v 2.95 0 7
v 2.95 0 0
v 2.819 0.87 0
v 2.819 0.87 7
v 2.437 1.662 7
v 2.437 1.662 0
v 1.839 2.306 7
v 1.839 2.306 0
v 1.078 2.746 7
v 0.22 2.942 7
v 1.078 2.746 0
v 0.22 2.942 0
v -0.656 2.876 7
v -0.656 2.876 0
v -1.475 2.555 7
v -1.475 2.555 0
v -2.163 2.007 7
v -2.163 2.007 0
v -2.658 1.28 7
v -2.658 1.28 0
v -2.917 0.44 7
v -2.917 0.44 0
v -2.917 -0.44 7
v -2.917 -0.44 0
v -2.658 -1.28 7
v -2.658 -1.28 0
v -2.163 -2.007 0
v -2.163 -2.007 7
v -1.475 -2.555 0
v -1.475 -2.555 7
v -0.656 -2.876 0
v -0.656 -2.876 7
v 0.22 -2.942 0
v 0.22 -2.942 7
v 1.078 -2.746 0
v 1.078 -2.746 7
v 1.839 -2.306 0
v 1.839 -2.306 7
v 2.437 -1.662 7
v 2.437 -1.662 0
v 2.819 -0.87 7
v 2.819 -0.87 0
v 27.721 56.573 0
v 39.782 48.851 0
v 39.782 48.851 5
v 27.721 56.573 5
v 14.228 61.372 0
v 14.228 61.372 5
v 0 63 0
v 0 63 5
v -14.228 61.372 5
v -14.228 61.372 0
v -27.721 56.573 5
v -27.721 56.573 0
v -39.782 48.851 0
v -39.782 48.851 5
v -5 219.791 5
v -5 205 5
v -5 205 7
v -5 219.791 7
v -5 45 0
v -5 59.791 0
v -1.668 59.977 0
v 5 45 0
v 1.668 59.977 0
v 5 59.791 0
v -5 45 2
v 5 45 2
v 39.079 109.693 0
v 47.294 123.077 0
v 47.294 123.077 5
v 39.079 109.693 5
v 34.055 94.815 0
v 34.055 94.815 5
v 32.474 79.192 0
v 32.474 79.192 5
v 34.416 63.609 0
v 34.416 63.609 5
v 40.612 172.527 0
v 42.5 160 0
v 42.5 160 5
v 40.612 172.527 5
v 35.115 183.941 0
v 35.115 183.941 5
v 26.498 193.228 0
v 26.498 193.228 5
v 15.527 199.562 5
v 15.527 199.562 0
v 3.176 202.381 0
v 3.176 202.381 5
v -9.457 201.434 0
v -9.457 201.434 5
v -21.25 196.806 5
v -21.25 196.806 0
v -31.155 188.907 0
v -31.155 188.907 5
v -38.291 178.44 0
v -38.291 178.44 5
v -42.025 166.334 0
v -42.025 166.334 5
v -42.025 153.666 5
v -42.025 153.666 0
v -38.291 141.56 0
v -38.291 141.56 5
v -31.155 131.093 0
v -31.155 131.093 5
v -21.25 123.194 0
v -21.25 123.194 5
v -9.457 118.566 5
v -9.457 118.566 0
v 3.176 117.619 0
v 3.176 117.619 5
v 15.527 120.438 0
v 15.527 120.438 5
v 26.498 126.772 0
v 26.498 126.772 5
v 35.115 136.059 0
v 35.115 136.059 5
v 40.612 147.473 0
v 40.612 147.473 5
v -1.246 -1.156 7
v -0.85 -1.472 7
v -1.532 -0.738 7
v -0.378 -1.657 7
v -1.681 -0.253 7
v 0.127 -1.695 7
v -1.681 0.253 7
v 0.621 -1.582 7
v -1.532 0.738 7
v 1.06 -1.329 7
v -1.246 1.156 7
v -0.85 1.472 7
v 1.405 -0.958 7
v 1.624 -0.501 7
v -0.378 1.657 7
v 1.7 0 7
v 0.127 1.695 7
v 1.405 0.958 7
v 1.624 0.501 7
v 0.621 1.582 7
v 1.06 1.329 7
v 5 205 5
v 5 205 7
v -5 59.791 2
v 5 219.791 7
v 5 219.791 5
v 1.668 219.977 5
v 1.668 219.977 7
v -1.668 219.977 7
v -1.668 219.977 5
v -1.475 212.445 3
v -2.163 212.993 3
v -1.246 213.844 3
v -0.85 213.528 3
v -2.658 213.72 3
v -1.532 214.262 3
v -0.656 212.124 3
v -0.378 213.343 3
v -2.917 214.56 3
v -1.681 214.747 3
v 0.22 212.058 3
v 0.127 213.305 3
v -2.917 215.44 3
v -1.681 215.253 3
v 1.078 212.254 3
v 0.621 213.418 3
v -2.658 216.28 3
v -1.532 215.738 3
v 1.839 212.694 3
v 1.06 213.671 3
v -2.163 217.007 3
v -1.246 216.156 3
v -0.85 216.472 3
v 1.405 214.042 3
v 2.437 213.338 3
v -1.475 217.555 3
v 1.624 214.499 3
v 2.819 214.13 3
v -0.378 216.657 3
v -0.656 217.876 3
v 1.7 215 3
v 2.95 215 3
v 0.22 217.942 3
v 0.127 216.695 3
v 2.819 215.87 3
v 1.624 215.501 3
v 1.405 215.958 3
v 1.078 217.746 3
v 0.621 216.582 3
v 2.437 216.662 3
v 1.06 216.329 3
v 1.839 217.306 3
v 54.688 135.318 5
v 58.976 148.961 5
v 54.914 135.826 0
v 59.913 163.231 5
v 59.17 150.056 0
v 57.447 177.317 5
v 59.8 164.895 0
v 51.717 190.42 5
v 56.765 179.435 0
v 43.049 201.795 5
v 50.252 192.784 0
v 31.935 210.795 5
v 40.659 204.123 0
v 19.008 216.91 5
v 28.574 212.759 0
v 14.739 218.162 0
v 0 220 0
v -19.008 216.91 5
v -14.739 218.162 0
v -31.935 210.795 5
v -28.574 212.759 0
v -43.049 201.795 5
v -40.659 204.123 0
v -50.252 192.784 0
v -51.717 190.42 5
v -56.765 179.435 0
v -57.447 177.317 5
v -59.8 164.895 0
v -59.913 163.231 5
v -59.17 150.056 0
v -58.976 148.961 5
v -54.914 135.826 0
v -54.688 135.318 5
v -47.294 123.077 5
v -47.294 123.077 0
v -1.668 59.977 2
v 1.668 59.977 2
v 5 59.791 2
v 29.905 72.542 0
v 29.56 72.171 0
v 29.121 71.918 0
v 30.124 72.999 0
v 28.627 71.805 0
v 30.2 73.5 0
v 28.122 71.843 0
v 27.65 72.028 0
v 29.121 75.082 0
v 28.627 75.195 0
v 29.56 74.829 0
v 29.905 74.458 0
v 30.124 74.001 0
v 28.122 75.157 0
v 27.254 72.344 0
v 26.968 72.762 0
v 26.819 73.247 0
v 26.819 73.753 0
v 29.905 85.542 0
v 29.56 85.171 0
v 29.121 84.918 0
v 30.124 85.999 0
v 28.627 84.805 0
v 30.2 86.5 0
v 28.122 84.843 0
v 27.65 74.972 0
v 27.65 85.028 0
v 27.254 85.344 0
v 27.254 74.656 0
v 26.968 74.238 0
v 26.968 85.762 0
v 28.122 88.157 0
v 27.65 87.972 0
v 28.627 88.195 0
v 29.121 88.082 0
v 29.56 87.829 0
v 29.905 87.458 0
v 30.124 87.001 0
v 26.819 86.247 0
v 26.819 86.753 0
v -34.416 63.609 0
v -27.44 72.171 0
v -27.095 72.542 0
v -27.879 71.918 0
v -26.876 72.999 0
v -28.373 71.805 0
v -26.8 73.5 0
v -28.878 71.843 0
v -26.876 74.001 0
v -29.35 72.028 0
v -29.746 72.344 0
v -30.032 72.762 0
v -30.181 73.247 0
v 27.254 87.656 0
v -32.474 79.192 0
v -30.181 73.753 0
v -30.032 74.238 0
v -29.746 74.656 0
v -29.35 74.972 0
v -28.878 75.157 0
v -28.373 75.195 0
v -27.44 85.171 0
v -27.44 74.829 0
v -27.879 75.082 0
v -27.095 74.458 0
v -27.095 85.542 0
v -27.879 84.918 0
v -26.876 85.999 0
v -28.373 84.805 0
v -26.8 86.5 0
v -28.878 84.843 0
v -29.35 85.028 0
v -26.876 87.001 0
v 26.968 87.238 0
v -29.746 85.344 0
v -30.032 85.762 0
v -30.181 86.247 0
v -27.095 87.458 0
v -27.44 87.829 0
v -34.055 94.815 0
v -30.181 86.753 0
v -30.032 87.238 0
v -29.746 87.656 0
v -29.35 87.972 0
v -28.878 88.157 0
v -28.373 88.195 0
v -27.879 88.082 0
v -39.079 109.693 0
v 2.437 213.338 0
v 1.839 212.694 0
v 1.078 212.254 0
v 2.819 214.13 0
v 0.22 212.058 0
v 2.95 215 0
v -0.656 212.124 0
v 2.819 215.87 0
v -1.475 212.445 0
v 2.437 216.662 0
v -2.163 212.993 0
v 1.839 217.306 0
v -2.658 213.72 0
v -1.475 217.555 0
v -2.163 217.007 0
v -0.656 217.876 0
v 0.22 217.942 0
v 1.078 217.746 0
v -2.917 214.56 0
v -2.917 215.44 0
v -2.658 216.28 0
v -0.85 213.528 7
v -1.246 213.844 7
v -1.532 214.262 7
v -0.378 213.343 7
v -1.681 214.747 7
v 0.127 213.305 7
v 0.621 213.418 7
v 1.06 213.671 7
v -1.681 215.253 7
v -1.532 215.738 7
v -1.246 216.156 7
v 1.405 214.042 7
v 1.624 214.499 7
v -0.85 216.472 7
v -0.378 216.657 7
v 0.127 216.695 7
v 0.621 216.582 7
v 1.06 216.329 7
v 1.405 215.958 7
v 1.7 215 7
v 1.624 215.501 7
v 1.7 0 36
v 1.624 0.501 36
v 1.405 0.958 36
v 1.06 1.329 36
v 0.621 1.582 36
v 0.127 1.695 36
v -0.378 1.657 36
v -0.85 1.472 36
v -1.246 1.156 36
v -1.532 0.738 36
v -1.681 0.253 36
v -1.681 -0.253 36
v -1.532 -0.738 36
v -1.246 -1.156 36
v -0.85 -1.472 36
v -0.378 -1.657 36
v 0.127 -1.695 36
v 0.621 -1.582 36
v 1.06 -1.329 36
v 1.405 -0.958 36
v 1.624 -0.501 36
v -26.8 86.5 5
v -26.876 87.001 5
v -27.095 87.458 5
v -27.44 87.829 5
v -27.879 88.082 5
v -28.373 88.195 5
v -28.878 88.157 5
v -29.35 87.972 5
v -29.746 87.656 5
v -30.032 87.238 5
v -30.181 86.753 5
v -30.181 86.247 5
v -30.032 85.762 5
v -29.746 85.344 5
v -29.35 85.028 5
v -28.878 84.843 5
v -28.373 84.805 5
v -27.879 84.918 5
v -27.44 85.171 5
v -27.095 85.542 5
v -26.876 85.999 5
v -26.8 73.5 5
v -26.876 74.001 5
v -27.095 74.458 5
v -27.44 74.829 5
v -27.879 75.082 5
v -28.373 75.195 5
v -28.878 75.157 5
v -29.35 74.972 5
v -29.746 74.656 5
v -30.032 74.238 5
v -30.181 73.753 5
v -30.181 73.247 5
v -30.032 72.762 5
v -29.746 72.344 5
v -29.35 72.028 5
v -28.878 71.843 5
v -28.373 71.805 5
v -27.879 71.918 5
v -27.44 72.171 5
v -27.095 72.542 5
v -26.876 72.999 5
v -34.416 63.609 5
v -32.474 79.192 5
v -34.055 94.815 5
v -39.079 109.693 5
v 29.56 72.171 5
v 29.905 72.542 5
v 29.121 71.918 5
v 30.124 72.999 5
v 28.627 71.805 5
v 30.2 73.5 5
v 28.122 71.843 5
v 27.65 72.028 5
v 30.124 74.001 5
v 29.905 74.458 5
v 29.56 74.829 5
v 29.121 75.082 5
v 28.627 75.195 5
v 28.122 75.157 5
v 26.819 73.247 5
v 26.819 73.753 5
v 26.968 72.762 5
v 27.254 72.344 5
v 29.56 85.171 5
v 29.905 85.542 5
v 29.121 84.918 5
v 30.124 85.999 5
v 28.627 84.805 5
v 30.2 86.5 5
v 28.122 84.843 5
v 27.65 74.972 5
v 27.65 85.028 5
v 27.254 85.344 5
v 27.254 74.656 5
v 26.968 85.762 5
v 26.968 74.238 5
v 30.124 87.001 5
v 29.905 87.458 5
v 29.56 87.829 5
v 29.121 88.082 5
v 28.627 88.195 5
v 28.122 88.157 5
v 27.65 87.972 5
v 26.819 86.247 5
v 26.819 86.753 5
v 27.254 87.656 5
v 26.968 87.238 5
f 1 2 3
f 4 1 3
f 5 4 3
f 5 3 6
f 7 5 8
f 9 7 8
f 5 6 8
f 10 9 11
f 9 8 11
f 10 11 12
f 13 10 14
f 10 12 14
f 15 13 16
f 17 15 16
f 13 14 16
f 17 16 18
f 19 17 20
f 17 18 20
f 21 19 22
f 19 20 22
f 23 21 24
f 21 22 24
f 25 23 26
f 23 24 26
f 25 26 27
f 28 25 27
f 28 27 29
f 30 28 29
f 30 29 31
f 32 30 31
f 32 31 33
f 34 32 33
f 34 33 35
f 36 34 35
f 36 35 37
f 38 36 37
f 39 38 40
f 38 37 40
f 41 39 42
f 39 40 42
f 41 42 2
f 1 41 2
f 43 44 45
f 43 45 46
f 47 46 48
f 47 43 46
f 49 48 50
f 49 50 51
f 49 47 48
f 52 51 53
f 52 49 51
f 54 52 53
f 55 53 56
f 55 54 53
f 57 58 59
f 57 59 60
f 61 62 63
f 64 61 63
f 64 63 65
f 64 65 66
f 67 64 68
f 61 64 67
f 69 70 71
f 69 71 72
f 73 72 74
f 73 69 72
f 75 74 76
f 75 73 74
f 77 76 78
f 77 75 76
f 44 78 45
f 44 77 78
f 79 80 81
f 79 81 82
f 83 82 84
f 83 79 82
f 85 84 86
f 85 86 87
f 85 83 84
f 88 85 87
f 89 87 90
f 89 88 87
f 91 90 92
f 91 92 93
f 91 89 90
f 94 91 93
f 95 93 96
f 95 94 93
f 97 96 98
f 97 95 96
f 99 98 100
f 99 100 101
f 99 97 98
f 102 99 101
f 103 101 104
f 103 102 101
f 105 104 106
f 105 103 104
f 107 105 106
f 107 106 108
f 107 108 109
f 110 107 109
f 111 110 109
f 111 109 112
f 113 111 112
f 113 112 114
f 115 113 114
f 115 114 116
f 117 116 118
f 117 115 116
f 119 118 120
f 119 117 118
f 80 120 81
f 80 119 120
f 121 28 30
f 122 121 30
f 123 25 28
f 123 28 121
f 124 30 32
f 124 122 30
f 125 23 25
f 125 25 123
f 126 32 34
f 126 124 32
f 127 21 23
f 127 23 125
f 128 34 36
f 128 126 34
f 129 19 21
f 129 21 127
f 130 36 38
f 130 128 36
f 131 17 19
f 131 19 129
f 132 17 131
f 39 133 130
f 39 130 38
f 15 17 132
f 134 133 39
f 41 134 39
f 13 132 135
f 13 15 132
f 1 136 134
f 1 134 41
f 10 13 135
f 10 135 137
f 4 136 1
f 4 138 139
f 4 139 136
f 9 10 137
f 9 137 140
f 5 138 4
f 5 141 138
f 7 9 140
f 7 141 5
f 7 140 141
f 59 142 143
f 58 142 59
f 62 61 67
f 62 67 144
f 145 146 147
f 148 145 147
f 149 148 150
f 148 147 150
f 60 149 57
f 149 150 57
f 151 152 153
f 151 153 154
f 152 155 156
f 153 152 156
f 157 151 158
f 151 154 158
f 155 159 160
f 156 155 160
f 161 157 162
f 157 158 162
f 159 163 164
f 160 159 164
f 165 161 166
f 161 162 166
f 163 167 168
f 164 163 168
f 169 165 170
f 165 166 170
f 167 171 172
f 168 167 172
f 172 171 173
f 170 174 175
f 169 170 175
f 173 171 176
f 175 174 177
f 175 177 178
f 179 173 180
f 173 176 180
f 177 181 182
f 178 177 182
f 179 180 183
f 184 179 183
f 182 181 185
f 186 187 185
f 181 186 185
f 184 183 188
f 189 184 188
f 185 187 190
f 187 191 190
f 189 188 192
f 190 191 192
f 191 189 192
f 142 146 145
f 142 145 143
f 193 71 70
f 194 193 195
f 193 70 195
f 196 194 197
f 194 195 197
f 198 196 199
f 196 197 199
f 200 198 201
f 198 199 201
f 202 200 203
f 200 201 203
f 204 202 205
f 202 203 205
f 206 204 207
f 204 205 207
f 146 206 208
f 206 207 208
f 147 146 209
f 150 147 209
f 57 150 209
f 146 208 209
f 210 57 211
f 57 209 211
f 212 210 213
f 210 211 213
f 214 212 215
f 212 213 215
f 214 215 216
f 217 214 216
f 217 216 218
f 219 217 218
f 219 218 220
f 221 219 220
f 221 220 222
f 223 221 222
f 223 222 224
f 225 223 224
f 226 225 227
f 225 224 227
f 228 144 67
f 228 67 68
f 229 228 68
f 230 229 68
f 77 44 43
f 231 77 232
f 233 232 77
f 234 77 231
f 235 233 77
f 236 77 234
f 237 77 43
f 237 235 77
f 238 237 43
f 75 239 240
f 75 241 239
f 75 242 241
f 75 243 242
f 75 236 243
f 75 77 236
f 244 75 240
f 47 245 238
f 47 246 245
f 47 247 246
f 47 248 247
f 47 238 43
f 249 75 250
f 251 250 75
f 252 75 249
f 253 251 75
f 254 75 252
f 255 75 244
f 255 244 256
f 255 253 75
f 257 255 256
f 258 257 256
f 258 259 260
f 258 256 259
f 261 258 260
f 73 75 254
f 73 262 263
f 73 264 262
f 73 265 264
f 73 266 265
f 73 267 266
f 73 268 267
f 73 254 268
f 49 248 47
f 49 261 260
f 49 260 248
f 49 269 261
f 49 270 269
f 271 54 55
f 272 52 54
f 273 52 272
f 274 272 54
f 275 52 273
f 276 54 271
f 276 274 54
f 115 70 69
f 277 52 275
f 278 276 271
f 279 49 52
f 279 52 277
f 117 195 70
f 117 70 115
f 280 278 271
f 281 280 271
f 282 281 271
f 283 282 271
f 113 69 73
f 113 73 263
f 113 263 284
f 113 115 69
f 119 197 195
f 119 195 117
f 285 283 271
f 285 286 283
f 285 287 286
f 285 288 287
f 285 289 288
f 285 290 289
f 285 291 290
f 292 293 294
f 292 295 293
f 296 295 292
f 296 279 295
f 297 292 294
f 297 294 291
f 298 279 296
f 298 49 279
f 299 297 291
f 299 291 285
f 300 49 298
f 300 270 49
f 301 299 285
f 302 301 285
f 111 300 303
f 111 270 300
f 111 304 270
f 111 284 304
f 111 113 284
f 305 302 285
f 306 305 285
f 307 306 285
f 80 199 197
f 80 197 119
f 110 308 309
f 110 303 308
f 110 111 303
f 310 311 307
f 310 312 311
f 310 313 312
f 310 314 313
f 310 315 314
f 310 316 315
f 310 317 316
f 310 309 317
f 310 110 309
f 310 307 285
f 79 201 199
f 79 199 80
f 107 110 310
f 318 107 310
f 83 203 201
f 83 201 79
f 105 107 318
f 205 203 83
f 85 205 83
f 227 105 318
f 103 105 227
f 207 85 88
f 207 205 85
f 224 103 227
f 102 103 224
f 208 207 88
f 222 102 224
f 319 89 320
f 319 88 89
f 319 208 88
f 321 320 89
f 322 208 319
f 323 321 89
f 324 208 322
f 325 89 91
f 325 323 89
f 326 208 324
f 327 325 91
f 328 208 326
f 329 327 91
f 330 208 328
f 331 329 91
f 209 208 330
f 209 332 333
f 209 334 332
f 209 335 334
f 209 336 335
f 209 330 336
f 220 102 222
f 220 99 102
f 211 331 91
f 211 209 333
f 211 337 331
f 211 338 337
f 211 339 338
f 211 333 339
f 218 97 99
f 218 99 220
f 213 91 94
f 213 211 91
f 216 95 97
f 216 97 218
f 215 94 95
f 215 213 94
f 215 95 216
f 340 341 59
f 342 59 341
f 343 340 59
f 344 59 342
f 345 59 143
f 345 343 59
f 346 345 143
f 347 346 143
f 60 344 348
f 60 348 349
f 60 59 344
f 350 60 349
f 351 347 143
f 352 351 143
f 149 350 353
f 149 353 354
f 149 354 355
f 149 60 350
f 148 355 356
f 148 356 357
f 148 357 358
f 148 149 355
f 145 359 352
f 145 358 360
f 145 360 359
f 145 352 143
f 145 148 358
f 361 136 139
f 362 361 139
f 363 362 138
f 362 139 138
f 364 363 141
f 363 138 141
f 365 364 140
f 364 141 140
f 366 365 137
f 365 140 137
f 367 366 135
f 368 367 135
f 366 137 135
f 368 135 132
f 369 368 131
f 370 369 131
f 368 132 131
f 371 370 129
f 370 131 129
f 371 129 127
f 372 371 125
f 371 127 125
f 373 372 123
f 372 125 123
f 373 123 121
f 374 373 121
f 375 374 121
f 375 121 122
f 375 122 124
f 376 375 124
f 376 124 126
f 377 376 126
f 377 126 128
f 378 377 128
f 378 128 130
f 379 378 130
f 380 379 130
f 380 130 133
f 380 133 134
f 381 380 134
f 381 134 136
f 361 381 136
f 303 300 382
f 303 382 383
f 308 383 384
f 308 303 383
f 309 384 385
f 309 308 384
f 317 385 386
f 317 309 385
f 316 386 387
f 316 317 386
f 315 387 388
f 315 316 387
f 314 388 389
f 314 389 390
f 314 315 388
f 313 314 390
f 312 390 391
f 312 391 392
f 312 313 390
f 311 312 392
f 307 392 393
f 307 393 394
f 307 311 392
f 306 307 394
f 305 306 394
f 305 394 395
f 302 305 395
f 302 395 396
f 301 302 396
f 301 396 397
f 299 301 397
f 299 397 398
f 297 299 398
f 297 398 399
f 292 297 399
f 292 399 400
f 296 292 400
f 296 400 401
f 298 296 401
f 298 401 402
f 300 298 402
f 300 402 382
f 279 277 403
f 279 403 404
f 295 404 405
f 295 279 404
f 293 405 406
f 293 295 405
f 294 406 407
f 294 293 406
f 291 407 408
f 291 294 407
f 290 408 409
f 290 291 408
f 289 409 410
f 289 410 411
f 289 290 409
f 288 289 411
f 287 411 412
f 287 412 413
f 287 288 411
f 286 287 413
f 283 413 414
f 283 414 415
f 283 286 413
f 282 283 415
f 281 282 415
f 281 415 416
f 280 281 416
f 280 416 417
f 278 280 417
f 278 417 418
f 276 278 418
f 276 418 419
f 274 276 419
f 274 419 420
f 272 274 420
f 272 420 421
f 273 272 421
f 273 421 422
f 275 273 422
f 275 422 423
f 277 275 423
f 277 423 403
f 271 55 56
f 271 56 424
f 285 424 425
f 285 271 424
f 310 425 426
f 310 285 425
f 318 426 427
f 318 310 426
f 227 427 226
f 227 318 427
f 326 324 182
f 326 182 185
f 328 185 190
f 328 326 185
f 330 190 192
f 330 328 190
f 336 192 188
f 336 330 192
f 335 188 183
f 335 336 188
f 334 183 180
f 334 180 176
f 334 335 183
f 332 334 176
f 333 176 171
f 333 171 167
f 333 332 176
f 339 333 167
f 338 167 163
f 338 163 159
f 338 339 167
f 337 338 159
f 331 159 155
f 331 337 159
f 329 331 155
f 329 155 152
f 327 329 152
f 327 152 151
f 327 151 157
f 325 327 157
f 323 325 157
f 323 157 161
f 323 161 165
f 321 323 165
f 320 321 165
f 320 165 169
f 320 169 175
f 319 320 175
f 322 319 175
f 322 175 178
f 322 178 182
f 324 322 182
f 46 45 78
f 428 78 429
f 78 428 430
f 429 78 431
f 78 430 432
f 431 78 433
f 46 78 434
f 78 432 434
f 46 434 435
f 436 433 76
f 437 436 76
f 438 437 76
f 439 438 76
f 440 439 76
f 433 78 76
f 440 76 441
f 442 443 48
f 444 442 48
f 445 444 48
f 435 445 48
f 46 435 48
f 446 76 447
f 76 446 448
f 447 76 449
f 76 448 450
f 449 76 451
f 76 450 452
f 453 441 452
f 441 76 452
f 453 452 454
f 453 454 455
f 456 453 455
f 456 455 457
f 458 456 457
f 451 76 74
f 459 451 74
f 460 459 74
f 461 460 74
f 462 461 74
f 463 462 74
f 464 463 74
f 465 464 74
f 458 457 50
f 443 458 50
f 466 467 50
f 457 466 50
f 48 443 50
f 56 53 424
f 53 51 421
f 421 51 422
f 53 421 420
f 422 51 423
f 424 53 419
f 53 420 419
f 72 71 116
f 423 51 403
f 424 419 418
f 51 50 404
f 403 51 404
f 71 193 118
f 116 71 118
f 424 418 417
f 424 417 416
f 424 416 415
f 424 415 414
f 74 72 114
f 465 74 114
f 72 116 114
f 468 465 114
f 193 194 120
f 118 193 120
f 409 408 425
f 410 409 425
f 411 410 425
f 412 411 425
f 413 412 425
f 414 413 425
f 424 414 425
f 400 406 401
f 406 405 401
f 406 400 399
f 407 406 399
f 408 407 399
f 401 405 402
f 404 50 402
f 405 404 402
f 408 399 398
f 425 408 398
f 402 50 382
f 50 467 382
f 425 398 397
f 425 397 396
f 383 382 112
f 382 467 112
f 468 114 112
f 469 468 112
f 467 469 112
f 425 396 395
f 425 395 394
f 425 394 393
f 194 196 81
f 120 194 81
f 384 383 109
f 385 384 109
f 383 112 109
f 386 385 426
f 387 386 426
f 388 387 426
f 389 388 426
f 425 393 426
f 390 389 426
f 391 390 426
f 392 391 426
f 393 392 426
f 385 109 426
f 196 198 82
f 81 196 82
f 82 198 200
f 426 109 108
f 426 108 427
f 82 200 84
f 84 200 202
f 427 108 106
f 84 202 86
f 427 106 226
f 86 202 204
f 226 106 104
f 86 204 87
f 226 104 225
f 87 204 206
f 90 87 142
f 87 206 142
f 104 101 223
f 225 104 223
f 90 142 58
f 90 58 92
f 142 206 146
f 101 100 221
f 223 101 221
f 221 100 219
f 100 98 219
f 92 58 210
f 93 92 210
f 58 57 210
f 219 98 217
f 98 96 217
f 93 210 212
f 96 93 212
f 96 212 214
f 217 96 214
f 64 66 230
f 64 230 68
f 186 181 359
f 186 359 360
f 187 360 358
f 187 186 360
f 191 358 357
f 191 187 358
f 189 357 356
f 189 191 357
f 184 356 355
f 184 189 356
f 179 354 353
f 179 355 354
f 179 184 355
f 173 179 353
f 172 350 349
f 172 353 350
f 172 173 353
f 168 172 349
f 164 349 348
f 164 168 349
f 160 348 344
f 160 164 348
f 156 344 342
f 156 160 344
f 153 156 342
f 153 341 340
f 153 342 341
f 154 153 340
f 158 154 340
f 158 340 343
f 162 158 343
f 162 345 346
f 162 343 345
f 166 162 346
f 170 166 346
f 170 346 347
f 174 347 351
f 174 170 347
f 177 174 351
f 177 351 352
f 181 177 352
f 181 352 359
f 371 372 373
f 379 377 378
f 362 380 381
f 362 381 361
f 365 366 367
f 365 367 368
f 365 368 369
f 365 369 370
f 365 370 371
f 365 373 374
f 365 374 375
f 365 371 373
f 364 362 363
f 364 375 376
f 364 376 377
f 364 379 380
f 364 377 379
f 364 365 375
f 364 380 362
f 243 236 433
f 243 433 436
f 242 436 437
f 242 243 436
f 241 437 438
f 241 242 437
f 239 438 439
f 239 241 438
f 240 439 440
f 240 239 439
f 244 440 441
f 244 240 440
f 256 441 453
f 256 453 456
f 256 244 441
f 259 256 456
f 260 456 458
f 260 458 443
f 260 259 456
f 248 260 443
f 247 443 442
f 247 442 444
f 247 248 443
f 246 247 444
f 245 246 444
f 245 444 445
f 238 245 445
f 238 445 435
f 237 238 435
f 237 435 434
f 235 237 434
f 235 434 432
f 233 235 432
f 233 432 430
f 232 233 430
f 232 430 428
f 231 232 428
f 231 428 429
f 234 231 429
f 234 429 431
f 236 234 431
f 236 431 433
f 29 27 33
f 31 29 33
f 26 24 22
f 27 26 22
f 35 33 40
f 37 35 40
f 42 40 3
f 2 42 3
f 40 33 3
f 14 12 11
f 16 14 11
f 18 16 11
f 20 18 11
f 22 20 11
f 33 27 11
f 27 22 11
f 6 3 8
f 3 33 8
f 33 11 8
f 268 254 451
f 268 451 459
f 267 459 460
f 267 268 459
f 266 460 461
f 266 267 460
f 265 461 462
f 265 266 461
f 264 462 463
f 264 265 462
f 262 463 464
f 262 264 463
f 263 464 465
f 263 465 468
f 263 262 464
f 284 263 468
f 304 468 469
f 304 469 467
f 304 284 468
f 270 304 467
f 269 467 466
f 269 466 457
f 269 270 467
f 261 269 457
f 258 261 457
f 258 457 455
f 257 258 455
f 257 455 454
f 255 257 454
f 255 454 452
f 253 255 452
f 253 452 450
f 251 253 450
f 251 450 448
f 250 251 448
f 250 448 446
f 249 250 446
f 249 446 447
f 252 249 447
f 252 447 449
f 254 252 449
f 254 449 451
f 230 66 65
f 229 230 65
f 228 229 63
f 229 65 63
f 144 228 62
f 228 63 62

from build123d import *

# Parameters (mm, degrees)
CYLINDER_R        = 2.95
CYLINDER_DEPTH    = 7
CYLINDER001_R     = 1.7
CYLINDER001_DEPTH = 30
PAD023_DEPTH      = 2
SKETCH033_R       = 42.5
PAD024_DEPTH      = 5


with BuildPart() as m3bolthead:
    # Cylinder → Cylinder (new body)
    with BuildSketch(Plane.XY):
        Circle(CYLINDER_R)
    extrude(amount=CYLINDER_DEPTH)


with BuildPart() as m3bolt:
    # Cylinder001 → Cylinder001 (new body)
    with BuildSketch(Plane.XY.offset(6)):
        Circle(CYLINDER001_R)
    extrude(amount=CYLINDER001_DEPTH)

    # Fusion: union M3BoltHead
    add(m3bolthead.part)


with BuildPart() as art2coversupportmaster:
    # Sketch032 → Pad023 (new body)
    with BuildSketch(Plane.XY):
        with BuildLine():
            ThreePointArc((5, 59.791304), (0, 60), (-5, 59.791304))
            Line((-5, 45), (-5, 59.791304))
            Line((5, 45), (-5, 45))
            Line((5, 59.791304), (5, 45))
        make_face()
    extrude(amount=PAD023_DEPTH)


with BuildPart() as clone_of_m3bolt060:
    # Clone194 base: copy of M3Bolt
    add(m3bolt.part)


with BuildPart() as clone_of_m3bolt060_1:
    # Clone194 placement: moved
    add(clone_of_m3bolt060.part.moved(Location((28.5, 73.5, -31))))


with BuildPart() as clone_of_m3bolt061:
    # Clone195 base: copy of M3Bolt
    add(m3bolt.part)


with BuildPart() as clone_of_m3bolt061_1:
    # Clone195 placement: moved
    add(clone_of_m3bolt061.part.moved(Location((-28.5, 73.5, -31))))


with BuildPart() as clone_of_m3bolt062:
    # Clone196 base: copy of M3Bolt
    add(m3bolt.part)


with BuildPart() as clone_of_m3bolt062_1:
    # Clone196 placement: moved
    add(clone_of_m3bolt062.part.moved(Location((-28.5, 86.5, -31))))


with BuildPart() as clone_of_m3bolt063:
    # Clone197 base: copy of M3Bolt
    add(m3bolt.part)


with BuildPart() as clone_of_m3bolt063_1:
    # Clone197 placement: moved
    add(clone_of_m3bolt063.part.moved(Location((0, 215, -4))))


with BuildPart() as fusion071:
    # Clone193 base: copy of M3Bolt
    add(m3bolt.part)


with BuildPart() as fusion071_1:
    # Clone193 placement: moved
    add(fusion071.part.moved(Location((28.5, 86.5, -31))))

    # Fusion071: union Clone of M3Bolt060, Clone of M3Bolt061, Clone of M3Bolt062, Clone of M3Bolt063
    add(clone_of_m3bolt060_1.part)
    add(clone_of_m3bolt061_1.part)
    add(clone_of_m3bolt062_1.part)
    add(clone_of_m3bolt063_1.part)


with BuildPart() as clone_of_art2coversupportmaster002:
    # Clone188 base: copy of Art2CoverSupportMaster
    add(art2coversupportmaster.part)


with BuildPart() as clone_of_art2coversupportmaster002_1:
    # Clone188 placement: moved
    add(clone_of_art2coversupportmaster002.part.moved(Location((0, 160, 5))))


with BuildPart() as art2bodyacover2:
    # Sketch033 → Pad024 (new body)
    with BuildSketch(Plane.XY):
        with BuildLine():
            ThreePointArc((47.29357, 123.07686), (32.82521, 87.047884), (39.782, 48.850716))
            ThreePointArc((39.782, 48.850716), (0, 63), (-39.782, 48.850716))
            ThreePointArc((-39.782, 48.850716), (-32.82521, 87.047884), (-47.29357, 123.07686))
            ThreePointArc((47.29357, 123.07686), (0, 220), (-47.29357, 123.07686))
        make_face()
        with Locations((0, 160)):
            Circle(SKETCH033_R, mode=Mode.SUBTRACT)
    extrude(amount=PAD024_DEPTH)

    # Fusion069: union Clone of Art2CoverSupportMaster002
    add(clone_of_art2coversupportmaster002_1.part)

    # Cut060: cut Fusion071
    add(fusion071_1.part, mode=Mode.SUBTRACT)


solid = Compound([m3bolt.part, art2coversupportmaster.part, art2bodyacover2.part])
